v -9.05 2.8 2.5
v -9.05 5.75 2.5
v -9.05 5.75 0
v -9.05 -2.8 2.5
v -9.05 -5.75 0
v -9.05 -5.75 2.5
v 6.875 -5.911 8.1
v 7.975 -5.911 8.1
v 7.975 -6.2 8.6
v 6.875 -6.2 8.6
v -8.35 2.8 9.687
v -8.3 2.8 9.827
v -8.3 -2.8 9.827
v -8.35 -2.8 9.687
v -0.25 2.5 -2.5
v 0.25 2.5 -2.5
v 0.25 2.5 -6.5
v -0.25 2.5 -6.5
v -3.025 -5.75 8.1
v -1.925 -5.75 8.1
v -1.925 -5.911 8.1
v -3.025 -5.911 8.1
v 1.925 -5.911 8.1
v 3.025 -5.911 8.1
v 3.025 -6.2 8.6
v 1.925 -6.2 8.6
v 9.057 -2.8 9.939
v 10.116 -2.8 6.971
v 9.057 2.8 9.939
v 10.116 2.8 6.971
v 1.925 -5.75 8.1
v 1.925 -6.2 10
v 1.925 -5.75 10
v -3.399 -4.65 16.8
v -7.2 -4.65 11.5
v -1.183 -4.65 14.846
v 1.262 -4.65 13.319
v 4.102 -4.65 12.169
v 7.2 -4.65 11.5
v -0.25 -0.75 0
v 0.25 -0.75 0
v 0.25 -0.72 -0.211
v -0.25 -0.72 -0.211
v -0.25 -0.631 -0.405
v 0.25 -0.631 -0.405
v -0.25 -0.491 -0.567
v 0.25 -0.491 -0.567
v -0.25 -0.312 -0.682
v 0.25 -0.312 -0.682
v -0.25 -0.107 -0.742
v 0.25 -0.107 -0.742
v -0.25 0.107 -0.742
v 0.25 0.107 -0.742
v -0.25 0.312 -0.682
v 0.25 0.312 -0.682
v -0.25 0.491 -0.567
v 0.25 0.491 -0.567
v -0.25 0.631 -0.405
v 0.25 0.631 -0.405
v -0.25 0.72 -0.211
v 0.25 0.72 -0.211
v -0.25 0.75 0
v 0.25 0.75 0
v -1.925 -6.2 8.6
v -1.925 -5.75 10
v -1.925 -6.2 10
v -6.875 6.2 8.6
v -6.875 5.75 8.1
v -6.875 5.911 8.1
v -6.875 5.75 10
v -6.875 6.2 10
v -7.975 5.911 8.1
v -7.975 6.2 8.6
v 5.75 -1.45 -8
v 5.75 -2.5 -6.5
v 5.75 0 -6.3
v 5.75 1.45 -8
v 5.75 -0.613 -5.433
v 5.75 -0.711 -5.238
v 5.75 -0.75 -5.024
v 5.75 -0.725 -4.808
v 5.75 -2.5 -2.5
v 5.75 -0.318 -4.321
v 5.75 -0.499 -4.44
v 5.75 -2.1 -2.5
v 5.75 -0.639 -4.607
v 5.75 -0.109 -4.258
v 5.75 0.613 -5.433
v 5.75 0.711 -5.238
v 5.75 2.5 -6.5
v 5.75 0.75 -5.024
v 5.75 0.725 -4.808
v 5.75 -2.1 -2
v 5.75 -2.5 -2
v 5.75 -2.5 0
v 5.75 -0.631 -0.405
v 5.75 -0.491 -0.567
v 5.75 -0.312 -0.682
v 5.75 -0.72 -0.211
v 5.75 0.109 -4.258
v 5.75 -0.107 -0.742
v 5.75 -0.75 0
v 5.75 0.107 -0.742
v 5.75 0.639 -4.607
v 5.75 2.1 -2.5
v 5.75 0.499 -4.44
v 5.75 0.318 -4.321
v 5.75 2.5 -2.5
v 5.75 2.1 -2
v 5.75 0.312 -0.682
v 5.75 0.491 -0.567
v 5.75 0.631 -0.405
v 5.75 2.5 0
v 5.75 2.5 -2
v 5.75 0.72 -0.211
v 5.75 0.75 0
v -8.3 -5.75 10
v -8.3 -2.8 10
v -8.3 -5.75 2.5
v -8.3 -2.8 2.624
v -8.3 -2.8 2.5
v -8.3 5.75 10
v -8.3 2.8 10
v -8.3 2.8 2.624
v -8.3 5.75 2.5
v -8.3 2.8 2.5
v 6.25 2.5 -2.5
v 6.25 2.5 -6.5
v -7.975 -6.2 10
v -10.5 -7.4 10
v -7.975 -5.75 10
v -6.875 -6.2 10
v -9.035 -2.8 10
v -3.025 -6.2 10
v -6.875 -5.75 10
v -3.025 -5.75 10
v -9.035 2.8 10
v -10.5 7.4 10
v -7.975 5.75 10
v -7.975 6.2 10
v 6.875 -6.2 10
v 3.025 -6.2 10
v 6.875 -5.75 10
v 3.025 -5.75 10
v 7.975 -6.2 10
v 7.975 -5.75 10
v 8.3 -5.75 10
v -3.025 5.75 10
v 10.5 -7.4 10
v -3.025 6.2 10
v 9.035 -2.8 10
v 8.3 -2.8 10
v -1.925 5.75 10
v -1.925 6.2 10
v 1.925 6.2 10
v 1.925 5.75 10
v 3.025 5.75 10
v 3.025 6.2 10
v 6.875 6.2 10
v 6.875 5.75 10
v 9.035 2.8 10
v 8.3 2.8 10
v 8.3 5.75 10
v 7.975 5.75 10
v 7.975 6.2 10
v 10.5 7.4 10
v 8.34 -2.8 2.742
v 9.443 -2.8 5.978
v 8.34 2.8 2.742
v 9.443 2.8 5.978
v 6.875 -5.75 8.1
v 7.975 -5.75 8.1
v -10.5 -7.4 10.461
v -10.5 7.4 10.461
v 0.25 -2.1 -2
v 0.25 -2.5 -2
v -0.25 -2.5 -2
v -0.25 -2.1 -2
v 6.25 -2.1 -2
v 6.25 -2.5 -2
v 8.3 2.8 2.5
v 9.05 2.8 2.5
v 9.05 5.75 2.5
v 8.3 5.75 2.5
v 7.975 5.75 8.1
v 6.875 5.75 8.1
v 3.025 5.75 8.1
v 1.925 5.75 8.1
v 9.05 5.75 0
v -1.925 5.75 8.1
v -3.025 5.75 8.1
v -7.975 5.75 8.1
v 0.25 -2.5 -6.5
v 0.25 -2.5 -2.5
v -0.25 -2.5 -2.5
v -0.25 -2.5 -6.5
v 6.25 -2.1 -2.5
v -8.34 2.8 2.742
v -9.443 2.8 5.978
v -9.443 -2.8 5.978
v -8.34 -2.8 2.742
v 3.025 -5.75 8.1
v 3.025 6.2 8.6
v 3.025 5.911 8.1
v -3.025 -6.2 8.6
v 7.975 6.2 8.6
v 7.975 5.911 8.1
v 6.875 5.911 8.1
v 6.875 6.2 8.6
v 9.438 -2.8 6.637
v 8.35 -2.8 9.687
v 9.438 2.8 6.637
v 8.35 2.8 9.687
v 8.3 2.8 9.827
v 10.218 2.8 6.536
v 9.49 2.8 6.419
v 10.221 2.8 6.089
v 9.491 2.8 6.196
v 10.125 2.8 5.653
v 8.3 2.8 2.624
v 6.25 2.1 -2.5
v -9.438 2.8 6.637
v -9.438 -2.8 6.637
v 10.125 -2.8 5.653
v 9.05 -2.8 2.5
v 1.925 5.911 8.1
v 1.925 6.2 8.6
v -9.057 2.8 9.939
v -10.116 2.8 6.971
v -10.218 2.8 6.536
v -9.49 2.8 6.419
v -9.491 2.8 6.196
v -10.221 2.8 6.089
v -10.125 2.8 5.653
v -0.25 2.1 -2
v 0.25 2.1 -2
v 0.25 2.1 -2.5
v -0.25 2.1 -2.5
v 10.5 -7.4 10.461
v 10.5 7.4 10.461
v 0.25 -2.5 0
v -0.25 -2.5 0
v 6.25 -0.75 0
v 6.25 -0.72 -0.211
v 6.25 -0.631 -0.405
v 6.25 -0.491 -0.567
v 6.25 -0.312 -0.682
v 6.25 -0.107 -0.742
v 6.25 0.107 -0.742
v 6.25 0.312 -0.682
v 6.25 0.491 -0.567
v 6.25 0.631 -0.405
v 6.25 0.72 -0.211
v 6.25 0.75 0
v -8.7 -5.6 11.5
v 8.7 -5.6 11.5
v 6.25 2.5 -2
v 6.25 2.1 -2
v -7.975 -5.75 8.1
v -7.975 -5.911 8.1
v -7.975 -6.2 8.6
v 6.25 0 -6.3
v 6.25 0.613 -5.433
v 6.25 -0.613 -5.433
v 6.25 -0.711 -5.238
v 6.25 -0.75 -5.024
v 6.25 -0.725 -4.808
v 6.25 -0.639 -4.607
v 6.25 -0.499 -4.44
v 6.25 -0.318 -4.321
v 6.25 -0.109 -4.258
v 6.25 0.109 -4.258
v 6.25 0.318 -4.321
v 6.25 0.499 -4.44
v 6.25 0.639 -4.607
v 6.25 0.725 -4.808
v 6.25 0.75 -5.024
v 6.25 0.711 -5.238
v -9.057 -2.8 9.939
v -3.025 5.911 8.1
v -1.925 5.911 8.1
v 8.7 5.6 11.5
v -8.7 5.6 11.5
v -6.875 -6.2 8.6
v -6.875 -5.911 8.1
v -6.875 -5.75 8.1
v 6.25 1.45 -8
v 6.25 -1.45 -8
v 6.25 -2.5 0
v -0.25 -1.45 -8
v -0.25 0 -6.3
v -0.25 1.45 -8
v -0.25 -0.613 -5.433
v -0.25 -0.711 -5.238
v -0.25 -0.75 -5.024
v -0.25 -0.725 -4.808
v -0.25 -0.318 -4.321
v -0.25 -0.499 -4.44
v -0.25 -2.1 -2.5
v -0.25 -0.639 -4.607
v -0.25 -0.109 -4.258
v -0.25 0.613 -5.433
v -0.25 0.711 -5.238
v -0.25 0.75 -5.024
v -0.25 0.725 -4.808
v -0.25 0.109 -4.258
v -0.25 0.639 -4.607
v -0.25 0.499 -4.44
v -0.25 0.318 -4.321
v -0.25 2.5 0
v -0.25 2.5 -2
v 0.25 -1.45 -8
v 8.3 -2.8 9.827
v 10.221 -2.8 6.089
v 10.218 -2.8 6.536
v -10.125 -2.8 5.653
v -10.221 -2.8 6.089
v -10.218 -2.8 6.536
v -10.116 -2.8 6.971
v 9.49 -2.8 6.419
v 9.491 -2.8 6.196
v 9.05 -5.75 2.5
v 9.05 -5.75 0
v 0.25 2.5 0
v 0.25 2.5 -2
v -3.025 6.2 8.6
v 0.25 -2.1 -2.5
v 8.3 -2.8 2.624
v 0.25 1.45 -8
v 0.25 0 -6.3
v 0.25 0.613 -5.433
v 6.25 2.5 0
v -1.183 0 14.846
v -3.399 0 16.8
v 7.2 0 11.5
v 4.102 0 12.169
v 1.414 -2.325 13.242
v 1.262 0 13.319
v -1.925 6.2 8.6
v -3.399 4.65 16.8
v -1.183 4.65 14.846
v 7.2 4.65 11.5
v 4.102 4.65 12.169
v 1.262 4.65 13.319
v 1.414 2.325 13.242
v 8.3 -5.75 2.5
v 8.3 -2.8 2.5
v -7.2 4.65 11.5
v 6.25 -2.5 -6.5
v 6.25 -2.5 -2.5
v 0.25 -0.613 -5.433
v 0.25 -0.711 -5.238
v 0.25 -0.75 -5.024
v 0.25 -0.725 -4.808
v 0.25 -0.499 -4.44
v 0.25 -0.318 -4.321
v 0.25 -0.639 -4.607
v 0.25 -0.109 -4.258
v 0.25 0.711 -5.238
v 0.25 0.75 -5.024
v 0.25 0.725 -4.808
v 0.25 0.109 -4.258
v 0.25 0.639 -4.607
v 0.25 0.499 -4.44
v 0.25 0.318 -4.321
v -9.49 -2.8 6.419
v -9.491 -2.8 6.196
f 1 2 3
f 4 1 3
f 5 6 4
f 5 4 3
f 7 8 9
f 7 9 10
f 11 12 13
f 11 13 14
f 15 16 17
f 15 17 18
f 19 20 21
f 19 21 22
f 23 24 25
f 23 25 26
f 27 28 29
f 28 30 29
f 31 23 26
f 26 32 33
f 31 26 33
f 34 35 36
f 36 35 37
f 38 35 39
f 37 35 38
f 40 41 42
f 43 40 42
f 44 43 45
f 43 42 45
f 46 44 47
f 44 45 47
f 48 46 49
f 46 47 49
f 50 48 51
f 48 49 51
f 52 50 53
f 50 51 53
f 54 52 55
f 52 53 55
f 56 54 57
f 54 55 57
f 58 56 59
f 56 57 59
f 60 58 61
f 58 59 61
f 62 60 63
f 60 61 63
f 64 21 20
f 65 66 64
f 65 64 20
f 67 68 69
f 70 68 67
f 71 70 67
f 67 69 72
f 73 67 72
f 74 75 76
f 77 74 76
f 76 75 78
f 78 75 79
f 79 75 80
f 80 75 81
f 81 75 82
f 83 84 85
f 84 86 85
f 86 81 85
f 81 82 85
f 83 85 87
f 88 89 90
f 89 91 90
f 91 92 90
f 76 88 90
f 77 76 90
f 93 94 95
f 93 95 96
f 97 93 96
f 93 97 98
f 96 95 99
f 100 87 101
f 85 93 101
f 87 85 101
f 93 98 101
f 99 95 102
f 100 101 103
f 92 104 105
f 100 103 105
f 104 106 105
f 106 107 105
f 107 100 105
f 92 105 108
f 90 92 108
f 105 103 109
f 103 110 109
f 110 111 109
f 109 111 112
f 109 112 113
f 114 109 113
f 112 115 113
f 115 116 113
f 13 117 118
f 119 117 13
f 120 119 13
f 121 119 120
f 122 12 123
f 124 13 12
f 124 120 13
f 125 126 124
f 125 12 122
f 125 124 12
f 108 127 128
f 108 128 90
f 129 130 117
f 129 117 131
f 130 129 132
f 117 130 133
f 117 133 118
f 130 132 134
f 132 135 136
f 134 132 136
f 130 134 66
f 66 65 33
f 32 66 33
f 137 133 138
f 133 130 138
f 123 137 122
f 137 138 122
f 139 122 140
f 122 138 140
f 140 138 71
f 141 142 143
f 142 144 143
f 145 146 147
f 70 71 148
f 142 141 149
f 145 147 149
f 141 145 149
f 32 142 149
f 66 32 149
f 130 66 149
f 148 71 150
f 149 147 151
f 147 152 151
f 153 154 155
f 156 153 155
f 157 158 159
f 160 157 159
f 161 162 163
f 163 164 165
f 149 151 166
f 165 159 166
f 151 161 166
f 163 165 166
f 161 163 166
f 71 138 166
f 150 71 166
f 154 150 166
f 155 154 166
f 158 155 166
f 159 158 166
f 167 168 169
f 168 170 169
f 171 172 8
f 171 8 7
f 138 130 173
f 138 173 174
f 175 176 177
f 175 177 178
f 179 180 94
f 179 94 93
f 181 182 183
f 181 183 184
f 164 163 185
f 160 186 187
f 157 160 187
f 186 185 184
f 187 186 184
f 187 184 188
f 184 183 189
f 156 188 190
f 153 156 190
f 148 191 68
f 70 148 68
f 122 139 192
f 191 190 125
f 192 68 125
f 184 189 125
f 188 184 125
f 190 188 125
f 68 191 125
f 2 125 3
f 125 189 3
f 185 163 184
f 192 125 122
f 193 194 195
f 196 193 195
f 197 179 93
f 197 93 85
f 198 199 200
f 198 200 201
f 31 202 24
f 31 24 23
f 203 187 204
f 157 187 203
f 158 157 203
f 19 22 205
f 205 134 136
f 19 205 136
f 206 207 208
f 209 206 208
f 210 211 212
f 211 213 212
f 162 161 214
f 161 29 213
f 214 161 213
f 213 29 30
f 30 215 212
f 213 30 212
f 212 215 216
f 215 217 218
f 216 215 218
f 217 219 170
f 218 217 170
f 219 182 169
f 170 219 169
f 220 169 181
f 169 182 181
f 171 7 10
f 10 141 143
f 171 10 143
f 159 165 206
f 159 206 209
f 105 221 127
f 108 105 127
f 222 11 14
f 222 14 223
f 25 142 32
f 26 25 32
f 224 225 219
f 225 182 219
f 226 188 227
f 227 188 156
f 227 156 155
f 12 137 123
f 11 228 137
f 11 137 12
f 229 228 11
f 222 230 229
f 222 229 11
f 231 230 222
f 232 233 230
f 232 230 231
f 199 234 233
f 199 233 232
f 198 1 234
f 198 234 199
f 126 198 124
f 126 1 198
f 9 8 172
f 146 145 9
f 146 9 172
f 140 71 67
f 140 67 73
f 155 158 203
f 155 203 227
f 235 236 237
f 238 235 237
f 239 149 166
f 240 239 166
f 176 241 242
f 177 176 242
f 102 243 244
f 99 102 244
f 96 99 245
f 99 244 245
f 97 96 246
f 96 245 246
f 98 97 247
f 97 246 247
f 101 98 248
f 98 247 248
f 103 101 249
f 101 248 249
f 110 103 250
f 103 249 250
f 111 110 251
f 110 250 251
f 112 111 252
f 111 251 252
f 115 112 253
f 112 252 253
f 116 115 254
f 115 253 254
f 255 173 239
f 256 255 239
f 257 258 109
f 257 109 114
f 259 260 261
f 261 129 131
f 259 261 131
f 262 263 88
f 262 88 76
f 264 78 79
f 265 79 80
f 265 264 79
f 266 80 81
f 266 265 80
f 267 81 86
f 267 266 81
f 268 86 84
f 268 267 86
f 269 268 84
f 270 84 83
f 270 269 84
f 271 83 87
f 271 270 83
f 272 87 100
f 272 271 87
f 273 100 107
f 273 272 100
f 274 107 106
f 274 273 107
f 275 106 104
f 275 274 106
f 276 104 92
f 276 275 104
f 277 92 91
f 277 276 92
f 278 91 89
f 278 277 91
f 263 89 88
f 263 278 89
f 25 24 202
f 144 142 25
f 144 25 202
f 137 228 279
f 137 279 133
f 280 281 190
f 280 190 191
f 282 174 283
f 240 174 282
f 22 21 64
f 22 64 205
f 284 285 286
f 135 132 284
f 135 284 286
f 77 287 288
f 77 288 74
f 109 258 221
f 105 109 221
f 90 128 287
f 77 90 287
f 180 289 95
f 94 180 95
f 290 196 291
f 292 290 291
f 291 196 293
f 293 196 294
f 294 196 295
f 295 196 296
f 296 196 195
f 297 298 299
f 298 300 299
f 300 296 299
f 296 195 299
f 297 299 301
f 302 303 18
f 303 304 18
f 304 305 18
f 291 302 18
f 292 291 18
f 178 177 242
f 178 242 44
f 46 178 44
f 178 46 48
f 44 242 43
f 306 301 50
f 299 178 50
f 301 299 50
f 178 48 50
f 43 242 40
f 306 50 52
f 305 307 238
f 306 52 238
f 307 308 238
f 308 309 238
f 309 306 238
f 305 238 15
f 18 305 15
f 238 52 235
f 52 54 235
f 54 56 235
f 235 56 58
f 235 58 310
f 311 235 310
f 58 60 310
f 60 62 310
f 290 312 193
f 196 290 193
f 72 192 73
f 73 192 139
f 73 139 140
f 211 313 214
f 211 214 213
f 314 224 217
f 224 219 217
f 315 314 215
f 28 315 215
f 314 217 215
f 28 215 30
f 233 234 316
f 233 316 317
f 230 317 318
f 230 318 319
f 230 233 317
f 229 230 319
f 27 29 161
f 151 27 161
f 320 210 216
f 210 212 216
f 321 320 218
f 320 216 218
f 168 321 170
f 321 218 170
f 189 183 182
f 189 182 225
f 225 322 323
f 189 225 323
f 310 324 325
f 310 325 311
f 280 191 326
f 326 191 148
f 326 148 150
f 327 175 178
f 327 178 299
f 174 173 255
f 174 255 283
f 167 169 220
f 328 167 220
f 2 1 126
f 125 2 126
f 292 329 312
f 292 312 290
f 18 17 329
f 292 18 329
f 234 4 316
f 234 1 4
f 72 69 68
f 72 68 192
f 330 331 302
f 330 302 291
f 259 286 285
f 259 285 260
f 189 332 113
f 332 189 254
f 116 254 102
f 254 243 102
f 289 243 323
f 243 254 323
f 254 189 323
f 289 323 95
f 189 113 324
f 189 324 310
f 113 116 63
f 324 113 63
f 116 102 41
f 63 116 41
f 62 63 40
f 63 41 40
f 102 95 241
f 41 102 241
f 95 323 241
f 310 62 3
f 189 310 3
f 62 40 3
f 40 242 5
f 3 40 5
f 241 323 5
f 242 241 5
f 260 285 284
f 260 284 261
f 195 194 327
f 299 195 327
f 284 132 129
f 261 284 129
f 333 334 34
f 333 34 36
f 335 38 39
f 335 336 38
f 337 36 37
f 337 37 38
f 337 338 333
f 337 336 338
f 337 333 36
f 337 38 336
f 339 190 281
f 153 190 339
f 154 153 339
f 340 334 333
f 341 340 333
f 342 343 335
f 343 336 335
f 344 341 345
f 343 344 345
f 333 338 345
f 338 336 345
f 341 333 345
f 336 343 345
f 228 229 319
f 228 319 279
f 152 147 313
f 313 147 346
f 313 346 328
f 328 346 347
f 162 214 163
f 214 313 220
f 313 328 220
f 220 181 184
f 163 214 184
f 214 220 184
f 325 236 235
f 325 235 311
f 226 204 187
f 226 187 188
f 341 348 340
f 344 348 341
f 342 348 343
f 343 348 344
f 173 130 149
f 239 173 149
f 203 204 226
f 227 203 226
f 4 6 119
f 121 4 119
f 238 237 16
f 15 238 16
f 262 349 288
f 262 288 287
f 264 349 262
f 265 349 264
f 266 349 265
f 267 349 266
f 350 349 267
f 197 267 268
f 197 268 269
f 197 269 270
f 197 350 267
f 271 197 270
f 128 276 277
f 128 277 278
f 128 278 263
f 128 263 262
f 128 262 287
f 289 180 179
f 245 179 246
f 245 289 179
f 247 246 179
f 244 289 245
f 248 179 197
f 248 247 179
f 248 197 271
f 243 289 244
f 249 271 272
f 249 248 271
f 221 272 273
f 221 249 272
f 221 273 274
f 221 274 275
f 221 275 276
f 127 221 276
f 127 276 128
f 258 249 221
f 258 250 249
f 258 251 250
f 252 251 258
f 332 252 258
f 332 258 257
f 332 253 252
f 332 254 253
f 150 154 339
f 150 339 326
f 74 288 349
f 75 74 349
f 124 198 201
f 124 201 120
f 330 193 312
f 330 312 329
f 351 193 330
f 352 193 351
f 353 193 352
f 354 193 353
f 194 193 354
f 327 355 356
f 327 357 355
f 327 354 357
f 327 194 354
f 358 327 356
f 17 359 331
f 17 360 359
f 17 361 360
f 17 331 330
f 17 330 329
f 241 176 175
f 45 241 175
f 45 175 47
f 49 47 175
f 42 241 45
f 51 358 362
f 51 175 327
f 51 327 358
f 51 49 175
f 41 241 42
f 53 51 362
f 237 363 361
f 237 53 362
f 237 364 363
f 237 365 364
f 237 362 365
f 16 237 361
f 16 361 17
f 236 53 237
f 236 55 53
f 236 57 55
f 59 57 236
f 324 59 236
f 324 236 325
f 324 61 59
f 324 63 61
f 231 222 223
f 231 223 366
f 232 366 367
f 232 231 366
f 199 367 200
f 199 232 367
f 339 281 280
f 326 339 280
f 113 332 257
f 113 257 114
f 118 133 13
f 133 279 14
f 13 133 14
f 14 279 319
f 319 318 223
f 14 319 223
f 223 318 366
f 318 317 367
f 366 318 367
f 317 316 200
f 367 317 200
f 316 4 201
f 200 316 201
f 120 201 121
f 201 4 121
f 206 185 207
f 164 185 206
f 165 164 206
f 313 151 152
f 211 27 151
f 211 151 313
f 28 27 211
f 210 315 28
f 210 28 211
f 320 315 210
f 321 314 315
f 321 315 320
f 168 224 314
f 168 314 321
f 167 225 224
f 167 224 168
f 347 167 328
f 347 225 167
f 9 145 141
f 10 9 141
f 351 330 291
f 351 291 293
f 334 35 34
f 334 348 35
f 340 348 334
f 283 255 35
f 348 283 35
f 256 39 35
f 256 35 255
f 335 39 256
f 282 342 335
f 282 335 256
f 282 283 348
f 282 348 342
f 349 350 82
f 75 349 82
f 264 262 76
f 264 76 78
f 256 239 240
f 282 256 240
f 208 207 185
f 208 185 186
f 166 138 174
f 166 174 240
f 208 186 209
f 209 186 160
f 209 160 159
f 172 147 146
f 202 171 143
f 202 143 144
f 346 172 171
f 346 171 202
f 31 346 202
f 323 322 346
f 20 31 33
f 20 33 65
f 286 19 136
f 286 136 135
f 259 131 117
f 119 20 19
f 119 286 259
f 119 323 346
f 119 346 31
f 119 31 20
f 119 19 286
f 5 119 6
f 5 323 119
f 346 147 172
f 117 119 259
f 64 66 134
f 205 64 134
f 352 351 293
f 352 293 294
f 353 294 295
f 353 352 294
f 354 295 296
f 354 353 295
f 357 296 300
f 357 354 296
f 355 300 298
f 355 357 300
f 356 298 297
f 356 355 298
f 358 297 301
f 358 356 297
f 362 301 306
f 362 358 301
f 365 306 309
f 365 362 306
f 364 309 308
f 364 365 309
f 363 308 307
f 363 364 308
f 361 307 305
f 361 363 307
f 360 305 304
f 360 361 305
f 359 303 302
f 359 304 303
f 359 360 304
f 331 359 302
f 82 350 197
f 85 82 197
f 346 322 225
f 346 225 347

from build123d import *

# Parameters (mm, degrees)
SKETCH1_W                = 16.6
SKETCH1_H                = 11.5
BOSS_EXTRUDE1_DEPTH      = 10
SKETCH2_W                = 21
SKETCH2_H                = 14.8
BOSS_EXTRUDE2_DEPTH      = 1.5
SKETCH3_W                = 0.5
SKETCH3_H                = 5
BOSS_EXTRUDE3_DEPTH      = 8
SKETCH4_W                = 0.5
SKETCH4_H                = 0.4
CUT_EXTRUDE1_DEPTH       = 17.75
BOSS_EXTRUDE4_START      = -5.75
SKETCH5_W                = 0.75
SKETCH5_H                = 2.5
BOSS_EXTRUDE4_DEPTH      = 11.5
BOSS_EXTRUDE5_DEPTH      = 2.8
BOSS_EXTRUDE5_DEPTH_BACK = 2.8
CHAMFER1_SIZE            = 1.8
CHAMFER1_SIZE2           = 1.039230485
BOSS_EXTRUDE6_DEPTH      = 4.65
SKETCH9_W                = 1.1
SKETCH9_H                = 0.45
BOSS_EXTRUDE7_DEPTH      = 1.9
CHAMFER2_SIZE            = 0.5
CHAMFER2_SIZE2           = 0.288675135
CHAMFER2_PART_2_SIZE     = 0.5
CHAMFER2_PART_2_SIZE2    = 0.288675135
CHAMFER2_PART_3_SIZE     = 0.5
CHAMFER2_PART_3_SIZE2    = 0.288675135
CHAMFER2_PART_4_SIZE     = 0.5
CHAMFER2_PART_4_SIZE2    = 0.288675135
CHAMFER2_PART_5_SIZE     = 0.5
CHAMFER2_PART_5_SIZE2    = 0.288675135
CHAMFER2_PART_6_SIZE     = 0.5
CHAMFER2_PART_6_SIZE2    = 0.288675135
CHAMFER2_PART_7_SIZE     = 0.5
CHAMFER2_PART_7_SIZE2    = 0.288675135
CHAMFER2_PART_8_SIZE     = 0.5
CHAMFER2_PART_8_SIZE2    = 0.288675135


with BuildPart() as part:
    # Sketch1 → Boss-Extrude1 (new body)
    with BuildSketch(Plane.XY):
        Rectangle(SKETCH1_W, SKETCH1_H)
    extrude(amount=BOSS_EXTRUDE1_DEPTH)

    # Sketch2 → Boss-Extrude2 (add)
    with BuildSketch(Plane.XY.offset(10)):
        Rectangle(SKETCH2_W, SKETCH2_H)
    extrude(amount=BOSS_EXTRUDE2_DEPTH)

    # Sketch3 → Boss-Extrude3 (add)
    with BuildSketch(Plane(origin=(0, 0, 0), x_dir=(-1, 0, 0), z_dir=(0, 0, -1))):
        with Locations((-6, 0)):
            Rectangle(SKETCH3_W, SKETCH3_H)
        Rectangle(SKETCH3_W, SKETCH3_H)
    extrude(amount=BOSS_EXTRUDE3_DEPTH)

    # Sketch4 → Cut-Extrude1 (cut, through all)
    with BuildSketch(Plane(origin=(6.25, 0, 0), x_dir=(0, 0, -1), z_dir=(1, 0, 0))):
        with Locations((2.25, 2.3)):
            Rectangle(SKETCH4_W, SKETCH4_H)
        with BuildLine():
            Line((0, 0.75), (0, -0.75))
            ThreePointArc((0, -0.75), (0.75, 0), (0, 0.75))
        make_face()
        Polygon((6.5, 2.5), (8, 1.449688693), (8, 2.5), align=None)
        with BuildLine():
            Line((5.432692308, 0.612598863), (6.3, 0))
            Line((6.3, 0), (5.432692308, -0.612598863))
            ThreePointArc((5.432692308, -0.612598863), (4.25, 0), (5.432692308, 0.612598863))
        make_face()
        Polygon((8, -2.5), (8, -1.449688693), (6.5, -2.5), align=None)
        with Locations((2.25, -2.3)):
            Rectangle(SKETCH4_W, SKETCH4_H)
    extrude(amount=-CUT_EXTRUDE1_DEPTH, mode=Mode.SUBTRACT)

    # Sketch5 → Boss-Extrude4 (add)
    with BuildSketch(Plane(origin=(0, 0, 0), x_dir=(1, 0, 0), z_dir=(0, 1, 0)).offset(BOSS_EXTRUDE4_START)):
        with Locations((-8.675, -1.25)):
            Rectangle(SKETCH5_W, SKETCH5_H)
    boss_extrude4 = extrude(amount=BOSS_EXTRUDE4_DEPTH)

    # Mirror1: Boss-Extrude4 across plane
    add(boss_extrude4.mirror(Plane(origin=(0, 0, 0), x_dir=(0, 0, 1), z_dir=(1, 0, 0))))

    # Sketch6 → Boss-Extrude5 (add, two sides)
    with BuildSketch(Plane(origin=(0, 0, 0), x_dir=(1, 0, 0), z_dir=(0, 1, 0))) as boss_extrude5_sk:
        with BuildLine():
            Line((-9.05, -2.5), (-10.124907983, -5.653347952))
            ThreePointArc((-10.124907983, -5.653347952), (-10.231819447, -6.312838644), (-10.115557515, -6.970745323))
            Line((-10.115557515, -6.970745323), (-9.056614332, -9.938626949))
            Line((-9.056614332, -9.938626949), (-9.034716365, -10))
            Line((-9.034716365, -10), (-8.3, -10))
            Line((-8.3, -10), (-8.3, -9.827371619))
            Line((-8.3, -9.827371619), (-8.350231447, -9.686588817))
            Line((-8.350231447, -9.686588817), (-9.438479941, -6.636573707))
            ThreePointArc((-9.438479941, -6.636573707), (-9.496610907, -6.307620368), (-9.443155175, -5.977875022))
            Line((-9.443155175, -5.977875022), (-8.34011069, -2.741985882))
            Line((-8.34011069, -2.741985882), (-8.3, -2.624317241))
            Line((-8.3, -2.624317241), (-8.3, -2.5))
            Line((-8.3, -2.5), (-9.05, -2.5))
        make_face()
        with BuildLine():
            Line((8.3, -9.827371619), (8.350231447, -9.686588817))
            Line((8.350231447, -9.686588817), (9.438479941, -6.636573707))
            ThreePointArc((9.438479941, -6.636573707), (9.496610907, -6.307620368), (9.443155175, -5.977875022))
            Line((9.443155175, -5.977875022), (8.34011069, -2.741985882))
            Line((8.34011069, -2.741985882), (8.3, -2.624317241))
            Line((8.3, -2.624317241), (8.3, -2.5))
            Line((8.3, -2.5), (9.05, -2.5))
            Line((9.05, -2.5), (10.124907983, -5.653347952))
            ThreePointArc((10.124907983, -5.653347952), (10.231819447, -6.312838644), (10.115557515, -6.970745323))
            Line((10.115557515, -6.970745323), (9.056614332, -9.938626949))
            Line((9.056614332, -9.938626949), (9.034716365, -10))
            Line((9.034716365, -10), (8.3, -10))
            Line((8.3, -10), (8.3, -9.827371619))
        make_face()
    extrude(amount=BOSS_EXTRUDE5_DEPTH)
    extrude(boss_extrude5_sk.sketch, amount=-BOSS_EXTRUDE5_DEPTH_BACK)

    # Chamfer1
    chamfer1_edges = [part.edges().sort_by_distance(p)[0] for p in [
        (10.5, 0, 11.5),
        (0, 7.4, 11.5),
        (-10.5, 0, 11.5),
        (0, -7.4, 11.5),
    ]]
    chamfer1_side = [part.faces().sort_by_distance(p)[0] for p in [
        (0, 0, 11.5),
    ]]
    chamfer(chamfer1_edges, length=CHAMFER1_SIZE, length2=CHAMFER1_SIZE2, reference=chamfer1_side[0])

    # Sketch7 → Boss-Extrude6 (add, symmetric)
    with BuildSketch(Plane(origin=(0, 0, 0), x_dir=(1, 0, 0), z_dir=(0, 1, 0))):
        with BuildLine():
            Line((-7.2, -11.5), (-3.398718251, -16.8))
            add(Edge.make_bspline(
                [(-3.398718251, -16.8), (0.927387699, -12.334784825), (7.2, -11.5)],
                knots=[0, 0, 0, 1, 1, 1], degree=2))
            Line((7.2, -11.5), (-7.2, -11.5))
        make_face()
    extrude(amount=BOSS_EXTRUDE6_DEPTH, both=True)

    # Sketch9 → Boss-Extrude7 (add)
    with BuildSketch(Plane(origin=(0, 0, 10), x_dir=(-1, 0, 0), z_dir=(0, 0, -1))):
        with Locations((-7.425, 5.975)):
            Rectangle(SKETCH9_W, SKETCH9_H)
        with Locations((-2.475, 5.975)):
            Rectangle(SKETCH9_W, SKETCH9_H)
        with Locations((2.475, 5.975)):
            Rectangle(SKETCH9_W, SKETCH9_H)
        with Locations((7.425, 5.975)):
            Rectangle(SKETCH9_W, SKETCH9_H)
        with Locations((7.425, -5.975)):
            Rectangle(SKETCH9_W, SKETCH9_H)
        with Locations((2.475, -5.975)):
            Rectangle(SKETCH9_W, SKETCH9_H)
        with Locations((-2.475, -5.975)):
            Rectangle(SKETCH9_W, SKETCH9_H)
        with Locations((-7.425, -5.975)):
            Rectangle(SKETCH9_W, SKETCH9_H)
    extrude(amount=BOSS_EXTRUDE7_DEPTH)

    # Chamfer2
    chamfer2_edges = [part.edges().sort_by_distance(p)[0] for p in [
        (7.425, 6.2, 8.1),
    ]]
    chamfer2_side = [part.faces().sort_by_distance(p)[0] for p in [
        (7.425, 6.2, 9.05),
    ]]
    chamfer(chamfer2_edges, length=CHAMFER2_SIZE, length2=CHAMFER2_SIZE2, reference=chamfer2_side[0])

    # Chamfer2 part 2
    chamfer2_part_2_edges = [part.edges().sort_by_distance(p)[0] for p in [
        (2.475, 6.2, 8.1),
    ]]
    chamfer2_part_2_side = [part.faces().sort_by_distance(p)[0] for p in [
        (2.475, 6.2, 9.05),
    ]]
    chamfer(chamfer2_part_2_edges, length=CHAMFER2_PART_2_SIZE, length2=CHAMFER2_PART_2_SIZE2, reference=chamfer2_part_2_side[0])

    # Chamfer2 part 3
    chamfer2_part_3_edges = [part.edges().sort_by_distance(p)[0] for p in [
        (-2.475, 6.2, 8.1),
    ]]
    chamfer2_part_3_side = [part.faces().sort_by_distance(p)[0] for p in [
        (-2.475, 6.2, 9.05),
    ]]
    chamfer(chamfer2_part_3_edges, length=CHAMFER2_PART_3_SIZE, length2=CHAMFER2_PART_3_SIZE2, reference=chamfer2_part_3_side[0])

    # Chamfer2 part 4
    chamfer2_part_4_edges = [part.edges().sort_by_distance(p)[0] for p in [
        (-7.425, 6.2, 8.1),
    ]]
    chamfer2_part_4_side = [part.faces().sort_by_distance(p)[0] for p in [
        (-7.425, 6.2, 9.05),
    ]]
    chamfer(chamfer2_part_4_edges, length=CHAMFER2_PART_4_SIZE, length2=CHAMFER2_PART_4_SIZE2, reference=chamfer2_part_4_side[0])

    # Chamfer2 part 5
    chamfer2_part_5_edges = [part.edges().sort_by_distance(p)[0] for p in [
        (-7.425, -6.2, 8.1),
    ]]
    chamfer2_part_5_side = [part.faces().sort_by_distance(p)[0] for p in [
        (-7.425, -6.2, 9.05),
    ]]
    chamfer(chamfer2_part_5_edges, length=CHAMFER2_PART_5_SIZE, length2=CHAMFER2_PART_5_SIZE2, reference=chamfer2_part_5_side[0])

    # Chamfer2 part 6
    chamfer2_part_6_edges = [part.edges().sort_by_distance(p)[0] for p in [
        (-2.475, -6.2, 8.1),
    ]]
    chamfer2_part_6_side = [part.faces().sort_by_distance(p)[0] for p in [
        (-2.475, -6.2, 9.05),
    ]]
    chamfer(chamfer2_part_6_edges, length=CHAMFER2_PART_6_SIZE, length2=CHAMFER2_PART_6_SIZE2, reference=chamfer2_part_6_side[0])

    # Chamfer2 part 7
    chamfer2_part_7_edges = [part.edges().sort_by_distance(p)[0] for p in [
        (2.475, -6.2, 8.1),
    ]]
    chamfer2_part_7_side = [part.faces().sort_by_distance(p)[0] for p in [
        (2.475, -6.2, 9.05),
    ]]
    chamfer(chamfer2_part_7_edges, length=CHAMFER2_PART_7_SIZE, length2=CHAMFER2_PART_7_SIZE2, reference=chamfer2_part_7_side[0])

    # Chamfer2 part 8
    chamfer2_part_8_edges = [part.edges().sort_by_distance(p)[0] for p in [
        (7.425, -6.2, 8.1),
    ]]
    chamfer2_part_8_side = [part.faces().sort_by_distance(p)[0] for p in [
        (7.425, -6.2, 9.05),
    ]]
    chamfer(chamfer2_part_8_edges, length=CHAMFER2_PART_8_SIZE, length2=CHAMFER2_PART_8_SIZE2, reference=chamfer2_part_8_side[0])


solid = part.part
